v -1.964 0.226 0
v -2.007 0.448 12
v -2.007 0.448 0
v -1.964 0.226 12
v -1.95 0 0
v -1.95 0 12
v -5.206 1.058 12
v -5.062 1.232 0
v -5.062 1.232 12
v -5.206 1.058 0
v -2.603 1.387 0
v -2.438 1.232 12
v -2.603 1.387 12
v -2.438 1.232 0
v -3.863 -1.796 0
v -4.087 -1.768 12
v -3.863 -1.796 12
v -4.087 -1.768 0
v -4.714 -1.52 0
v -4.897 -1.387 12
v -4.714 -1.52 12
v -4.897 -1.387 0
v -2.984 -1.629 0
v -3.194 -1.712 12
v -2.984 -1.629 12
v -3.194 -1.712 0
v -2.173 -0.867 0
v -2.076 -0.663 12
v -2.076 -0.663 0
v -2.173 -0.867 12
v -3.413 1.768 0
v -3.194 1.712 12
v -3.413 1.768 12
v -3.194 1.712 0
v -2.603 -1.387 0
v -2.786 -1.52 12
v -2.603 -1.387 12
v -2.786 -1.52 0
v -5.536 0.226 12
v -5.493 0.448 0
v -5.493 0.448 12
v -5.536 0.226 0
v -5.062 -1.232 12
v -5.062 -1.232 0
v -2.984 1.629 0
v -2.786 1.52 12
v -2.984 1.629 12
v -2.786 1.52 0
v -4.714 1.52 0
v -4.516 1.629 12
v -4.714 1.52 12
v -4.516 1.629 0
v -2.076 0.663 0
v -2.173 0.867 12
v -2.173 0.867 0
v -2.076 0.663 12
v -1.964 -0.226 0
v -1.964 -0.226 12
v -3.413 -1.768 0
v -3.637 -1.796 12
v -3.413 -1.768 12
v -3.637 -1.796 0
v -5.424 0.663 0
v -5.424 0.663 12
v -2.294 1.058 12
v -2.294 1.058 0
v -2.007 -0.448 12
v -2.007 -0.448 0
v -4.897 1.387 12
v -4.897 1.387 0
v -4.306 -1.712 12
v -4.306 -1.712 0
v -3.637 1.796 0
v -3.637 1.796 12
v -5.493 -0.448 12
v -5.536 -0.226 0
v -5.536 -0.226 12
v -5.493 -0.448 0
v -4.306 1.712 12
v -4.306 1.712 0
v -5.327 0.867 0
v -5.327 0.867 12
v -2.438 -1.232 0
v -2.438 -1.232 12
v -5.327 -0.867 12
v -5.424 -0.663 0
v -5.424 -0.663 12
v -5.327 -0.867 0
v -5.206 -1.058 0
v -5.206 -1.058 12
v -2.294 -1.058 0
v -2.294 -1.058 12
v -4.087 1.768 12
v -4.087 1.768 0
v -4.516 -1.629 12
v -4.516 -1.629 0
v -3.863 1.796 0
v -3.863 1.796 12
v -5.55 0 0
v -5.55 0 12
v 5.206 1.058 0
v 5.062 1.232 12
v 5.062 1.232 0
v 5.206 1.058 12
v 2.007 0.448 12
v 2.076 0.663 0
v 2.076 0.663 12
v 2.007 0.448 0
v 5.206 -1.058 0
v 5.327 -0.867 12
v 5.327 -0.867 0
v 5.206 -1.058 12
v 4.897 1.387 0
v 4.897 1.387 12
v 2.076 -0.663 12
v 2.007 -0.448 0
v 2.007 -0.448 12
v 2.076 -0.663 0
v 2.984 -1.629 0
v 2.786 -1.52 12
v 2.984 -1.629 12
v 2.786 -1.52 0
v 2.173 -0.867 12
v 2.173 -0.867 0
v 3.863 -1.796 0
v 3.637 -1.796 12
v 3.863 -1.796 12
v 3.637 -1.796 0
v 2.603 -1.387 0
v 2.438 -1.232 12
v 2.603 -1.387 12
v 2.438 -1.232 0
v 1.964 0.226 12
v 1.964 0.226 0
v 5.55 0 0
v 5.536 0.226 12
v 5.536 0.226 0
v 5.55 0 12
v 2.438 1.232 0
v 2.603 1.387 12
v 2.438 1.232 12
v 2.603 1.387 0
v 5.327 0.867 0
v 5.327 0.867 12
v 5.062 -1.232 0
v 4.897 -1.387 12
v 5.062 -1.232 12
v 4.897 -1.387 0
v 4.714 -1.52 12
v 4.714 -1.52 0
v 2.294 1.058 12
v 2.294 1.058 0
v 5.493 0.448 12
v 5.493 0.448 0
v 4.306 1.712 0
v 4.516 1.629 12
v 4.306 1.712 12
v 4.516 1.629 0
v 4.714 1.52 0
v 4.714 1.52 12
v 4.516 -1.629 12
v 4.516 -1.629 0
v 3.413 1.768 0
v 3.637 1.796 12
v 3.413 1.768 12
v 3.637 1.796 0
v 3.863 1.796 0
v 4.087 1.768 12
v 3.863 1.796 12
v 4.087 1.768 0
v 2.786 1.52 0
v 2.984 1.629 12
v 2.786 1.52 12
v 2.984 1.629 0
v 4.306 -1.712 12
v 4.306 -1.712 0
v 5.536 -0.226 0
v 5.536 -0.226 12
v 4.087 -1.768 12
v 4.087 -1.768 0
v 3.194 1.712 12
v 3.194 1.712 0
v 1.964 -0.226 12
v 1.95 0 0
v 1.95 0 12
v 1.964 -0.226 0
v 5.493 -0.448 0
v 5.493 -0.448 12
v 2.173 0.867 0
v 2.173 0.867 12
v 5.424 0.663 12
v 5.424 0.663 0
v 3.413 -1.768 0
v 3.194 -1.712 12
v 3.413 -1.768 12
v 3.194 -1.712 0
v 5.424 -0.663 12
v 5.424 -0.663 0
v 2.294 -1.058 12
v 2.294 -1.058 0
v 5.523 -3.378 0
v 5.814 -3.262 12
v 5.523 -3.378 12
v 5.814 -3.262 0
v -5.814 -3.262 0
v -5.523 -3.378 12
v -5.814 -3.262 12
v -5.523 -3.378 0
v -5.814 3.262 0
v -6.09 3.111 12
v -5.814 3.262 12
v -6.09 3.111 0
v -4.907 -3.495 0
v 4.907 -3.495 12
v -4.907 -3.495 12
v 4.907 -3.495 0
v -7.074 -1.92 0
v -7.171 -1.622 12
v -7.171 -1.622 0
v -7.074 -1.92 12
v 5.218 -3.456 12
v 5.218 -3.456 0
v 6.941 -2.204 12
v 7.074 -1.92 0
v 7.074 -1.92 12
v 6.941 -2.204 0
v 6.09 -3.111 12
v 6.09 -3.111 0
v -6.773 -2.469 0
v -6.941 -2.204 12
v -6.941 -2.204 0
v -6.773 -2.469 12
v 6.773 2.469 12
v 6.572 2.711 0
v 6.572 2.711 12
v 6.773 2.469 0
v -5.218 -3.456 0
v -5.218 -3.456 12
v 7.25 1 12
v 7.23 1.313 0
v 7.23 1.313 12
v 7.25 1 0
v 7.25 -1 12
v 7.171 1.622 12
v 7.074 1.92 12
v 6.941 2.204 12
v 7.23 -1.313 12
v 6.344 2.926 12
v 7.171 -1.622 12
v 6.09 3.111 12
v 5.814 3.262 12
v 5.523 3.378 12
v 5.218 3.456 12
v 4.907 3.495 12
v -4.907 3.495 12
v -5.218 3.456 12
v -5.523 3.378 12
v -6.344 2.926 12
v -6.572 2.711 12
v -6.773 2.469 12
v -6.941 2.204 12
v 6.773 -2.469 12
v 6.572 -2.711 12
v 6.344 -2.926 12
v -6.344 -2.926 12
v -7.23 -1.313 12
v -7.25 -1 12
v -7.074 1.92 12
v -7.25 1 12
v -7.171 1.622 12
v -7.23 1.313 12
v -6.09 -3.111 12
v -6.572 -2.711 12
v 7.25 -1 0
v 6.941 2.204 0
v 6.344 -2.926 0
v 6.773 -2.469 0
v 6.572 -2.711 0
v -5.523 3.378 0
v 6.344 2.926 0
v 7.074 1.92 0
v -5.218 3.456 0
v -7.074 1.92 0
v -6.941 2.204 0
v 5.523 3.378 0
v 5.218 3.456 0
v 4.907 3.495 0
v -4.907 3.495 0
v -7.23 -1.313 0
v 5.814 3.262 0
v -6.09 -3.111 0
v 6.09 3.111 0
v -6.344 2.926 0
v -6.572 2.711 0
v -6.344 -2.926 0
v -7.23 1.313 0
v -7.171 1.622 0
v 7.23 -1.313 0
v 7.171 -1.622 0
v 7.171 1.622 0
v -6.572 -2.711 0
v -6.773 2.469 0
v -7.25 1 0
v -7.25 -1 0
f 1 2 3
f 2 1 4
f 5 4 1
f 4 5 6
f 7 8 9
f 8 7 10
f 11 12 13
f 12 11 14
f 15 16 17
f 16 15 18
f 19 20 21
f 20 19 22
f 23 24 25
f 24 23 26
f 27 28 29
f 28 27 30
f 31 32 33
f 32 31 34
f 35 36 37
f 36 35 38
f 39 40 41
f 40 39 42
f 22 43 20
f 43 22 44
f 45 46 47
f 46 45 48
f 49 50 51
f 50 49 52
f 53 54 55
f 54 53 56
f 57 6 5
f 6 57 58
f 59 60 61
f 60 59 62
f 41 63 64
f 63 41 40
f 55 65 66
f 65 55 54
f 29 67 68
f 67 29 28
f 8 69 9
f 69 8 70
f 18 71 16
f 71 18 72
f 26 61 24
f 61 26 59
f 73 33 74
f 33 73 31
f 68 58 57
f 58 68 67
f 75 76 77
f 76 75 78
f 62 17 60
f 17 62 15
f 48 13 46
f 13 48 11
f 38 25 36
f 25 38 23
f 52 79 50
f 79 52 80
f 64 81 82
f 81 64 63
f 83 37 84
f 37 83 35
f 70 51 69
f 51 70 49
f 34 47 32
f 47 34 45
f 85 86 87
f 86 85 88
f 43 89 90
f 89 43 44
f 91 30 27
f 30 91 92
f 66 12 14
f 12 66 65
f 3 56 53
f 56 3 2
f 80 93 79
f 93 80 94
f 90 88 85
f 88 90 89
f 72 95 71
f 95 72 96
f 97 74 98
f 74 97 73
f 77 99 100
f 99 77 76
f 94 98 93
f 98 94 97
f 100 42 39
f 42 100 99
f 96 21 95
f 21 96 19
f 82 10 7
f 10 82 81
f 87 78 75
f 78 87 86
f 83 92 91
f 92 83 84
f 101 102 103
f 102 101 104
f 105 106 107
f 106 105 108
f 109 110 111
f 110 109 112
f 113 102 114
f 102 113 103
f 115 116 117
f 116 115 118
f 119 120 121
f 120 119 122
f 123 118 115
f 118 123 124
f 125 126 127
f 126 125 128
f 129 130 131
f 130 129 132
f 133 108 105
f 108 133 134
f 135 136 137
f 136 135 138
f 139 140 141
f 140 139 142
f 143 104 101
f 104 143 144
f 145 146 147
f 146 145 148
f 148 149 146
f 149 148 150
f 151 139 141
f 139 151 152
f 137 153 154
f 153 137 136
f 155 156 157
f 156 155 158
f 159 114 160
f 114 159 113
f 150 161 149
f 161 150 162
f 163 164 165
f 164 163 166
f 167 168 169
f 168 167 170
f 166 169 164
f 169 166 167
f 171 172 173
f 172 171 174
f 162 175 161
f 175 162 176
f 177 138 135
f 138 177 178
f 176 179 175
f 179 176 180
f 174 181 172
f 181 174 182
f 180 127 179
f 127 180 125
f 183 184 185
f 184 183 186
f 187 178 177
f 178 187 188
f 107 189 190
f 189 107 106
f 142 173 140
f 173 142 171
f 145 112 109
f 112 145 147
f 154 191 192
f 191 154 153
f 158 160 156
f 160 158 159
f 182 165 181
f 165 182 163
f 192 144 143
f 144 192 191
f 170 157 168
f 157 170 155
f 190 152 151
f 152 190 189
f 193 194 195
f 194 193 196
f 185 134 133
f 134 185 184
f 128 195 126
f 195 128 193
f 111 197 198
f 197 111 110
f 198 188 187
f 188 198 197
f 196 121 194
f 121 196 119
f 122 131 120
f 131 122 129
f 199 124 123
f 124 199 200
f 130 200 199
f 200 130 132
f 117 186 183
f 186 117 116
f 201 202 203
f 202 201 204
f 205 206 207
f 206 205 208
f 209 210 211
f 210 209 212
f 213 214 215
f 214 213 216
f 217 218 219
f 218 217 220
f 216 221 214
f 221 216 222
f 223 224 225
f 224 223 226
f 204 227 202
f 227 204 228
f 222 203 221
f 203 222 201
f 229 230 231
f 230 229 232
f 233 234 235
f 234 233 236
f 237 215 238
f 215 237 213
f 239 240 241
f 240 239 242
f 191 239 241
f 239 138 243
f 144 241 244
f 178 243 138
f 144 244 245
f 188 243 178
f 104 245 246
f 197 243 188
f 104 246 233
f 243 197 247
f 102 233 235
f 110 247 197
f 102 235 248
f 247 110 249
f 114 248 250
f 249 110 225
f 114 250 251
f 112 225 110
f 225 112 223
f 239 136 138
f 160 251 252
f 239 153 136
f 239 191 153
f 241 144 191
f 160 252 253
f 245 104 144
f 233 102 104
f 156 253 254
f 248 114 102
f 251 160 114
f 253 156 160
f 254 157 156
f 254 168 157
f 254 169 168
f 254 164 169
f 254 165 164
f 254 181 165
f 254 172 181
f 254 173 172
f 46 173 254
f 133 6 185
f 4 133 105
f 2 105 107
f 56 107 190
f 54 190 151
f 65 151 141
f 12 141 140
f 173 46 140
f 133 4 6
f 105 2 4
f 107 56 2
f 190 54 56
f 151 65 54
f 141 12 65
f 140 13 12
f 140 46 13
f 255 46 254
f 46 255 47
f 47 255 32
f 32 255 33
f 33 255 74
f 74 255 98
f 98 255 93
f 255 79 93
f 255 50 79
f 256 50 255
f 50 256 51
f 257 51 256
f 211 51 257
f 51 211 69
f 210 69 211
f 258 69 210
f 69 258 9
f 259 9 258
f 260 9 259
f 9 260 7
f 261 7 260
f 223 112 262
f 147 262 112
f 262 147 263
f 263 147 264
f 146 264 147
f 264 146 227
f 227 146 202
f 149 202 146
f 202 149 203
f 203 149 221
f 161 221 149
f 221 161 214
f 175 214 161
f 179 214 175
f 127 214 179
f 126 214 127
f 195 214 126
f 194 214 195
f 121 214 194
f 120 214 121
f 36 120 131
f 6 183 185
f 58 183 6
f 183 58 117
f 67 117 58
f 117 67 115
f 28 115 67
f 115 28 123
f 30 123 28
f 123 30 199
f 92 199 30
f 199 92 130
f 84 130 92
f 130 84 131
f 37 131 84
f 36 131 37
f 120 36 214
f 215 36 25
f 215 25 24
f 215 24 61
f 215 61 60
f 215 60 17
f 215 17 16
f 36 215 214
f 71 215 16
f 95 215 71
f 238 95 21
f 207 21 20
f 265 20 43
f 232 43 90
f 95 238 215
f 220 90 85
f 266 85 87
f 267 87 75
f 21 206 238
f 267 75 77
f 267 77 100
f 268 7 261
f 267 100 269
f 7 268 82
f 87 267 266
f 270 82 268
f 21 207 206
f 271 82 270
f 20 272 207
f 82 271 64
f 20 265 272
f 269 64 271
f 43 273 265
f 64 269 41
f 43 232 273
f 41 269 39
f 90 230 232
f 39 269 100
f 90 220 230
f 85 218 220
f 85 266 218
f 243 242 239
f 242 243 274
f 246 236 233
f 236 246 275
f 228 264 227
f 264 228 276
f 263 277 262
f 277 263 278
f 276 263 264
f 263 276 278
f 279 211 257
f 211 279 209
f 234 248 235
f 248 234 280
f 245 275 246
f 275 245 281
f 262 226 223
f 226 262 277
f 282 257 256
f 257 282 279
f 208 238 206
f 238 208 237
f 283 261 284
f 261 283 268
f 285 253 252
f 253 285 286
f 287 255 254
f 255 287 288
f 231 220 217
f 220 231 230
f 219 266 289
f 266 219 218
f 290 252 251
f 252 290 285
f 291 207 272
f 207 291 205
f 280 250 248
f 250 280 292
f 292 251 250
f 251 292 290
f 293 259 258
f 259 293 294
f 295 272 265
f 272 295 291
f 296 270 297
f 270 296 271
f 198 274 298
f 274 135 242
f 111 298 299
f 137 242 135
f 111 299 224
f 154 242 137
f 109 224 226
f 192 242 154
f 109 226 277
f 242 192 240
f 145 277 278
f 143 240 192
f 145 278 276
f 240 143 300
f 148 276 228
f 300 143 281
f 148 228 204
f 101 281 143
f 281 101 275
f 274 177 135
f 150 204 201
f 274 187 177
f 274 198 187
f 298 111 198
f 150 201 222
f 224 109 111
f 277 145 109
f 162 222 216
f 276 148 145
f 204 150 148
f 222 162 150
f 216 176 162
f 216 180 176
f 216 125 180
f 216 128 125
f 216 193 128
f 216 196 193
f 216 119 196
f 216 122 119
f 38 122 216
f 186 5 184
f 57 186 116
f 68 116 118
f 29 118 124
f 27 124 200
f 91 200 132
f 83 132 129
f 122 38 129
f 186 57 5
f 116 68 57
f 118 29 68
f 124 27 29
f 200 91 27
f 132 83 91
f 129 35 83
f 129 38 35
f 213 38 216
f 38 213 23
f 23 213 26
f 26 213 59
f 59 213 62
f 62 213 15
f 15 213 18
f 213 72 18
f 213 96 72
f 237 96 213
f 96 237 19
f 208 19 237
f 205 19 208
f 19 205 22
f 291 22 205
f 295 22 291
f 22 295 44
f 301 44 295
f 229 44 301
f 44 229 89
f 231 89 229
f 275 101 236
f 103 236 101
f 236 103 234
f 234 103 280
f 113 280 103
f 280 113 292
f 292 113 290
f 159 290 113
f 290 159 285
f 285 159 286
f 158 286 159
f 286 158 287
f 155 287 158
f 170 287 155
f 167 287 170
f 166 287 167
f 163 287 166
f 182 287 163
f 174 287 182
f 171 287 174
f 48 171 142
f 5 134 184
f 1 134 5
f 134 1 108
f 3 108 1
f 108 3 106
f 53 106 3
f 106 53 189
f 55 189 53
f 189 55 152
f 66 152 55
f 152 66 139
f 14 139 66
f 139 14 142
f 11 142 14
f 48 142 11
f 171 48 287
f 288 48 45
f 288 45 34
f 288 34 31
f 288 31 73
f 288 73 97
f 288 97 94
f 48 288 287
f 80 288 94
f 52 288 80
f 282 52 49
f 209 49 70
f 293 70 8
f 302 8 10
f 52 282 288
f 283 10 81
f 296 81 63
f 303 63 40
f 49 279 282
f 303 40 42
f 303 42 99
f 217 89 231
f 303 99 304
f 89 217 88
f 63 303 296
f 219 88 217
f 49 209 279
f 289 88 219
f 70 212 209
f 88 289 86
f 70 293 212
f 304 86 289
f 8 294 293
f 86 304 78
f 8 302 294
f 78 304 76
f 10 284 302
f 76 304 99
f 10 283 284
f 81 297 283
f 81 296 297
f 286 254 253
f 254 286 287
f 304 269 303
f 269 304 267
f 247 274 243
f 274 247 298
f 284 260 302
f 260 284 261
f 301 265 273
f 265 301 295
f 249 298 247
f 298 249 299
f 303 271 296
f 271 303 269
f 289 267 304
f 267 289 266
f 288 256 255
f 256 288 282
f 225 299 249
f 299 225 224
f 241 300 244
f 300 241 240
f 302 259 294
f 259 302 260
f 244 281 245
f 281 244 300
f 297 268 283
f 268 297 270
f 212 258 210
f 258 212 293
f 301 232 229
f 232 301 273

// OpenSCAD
$fn = 50;


difference() {
	union() {
		translate(v = [0, 0, 0]) {
			rotate(a = [0, 0, 0]) {
				hull() {
					translate(v = [-4.7500000000, 1.0000000000, 0]) {
						rotate(a = [0, 0, 0]) {
							translate(v = [0, 0, 0]) {
								rotate(a = [0, 0, 0]) {
									cylinder(h = 12, r = 2.5000000000);
								}
							}
						}
					}
					translate(v = [4.7500000000, 1.0000000000, 0]) {
						rotate(a = [0, 0, 0]) {
							translate(v = [0, 0, 0]) {
								rotate(a = [0, 0, 0]) {
									cylinder(h = 12, r = 2.5000000000);
								}
							}
						}
					}
					translate(v = [-4.7500000000, -1.0000000000, 0]) {
						rotate(a = [0, 0, 0]) {
							translate(v = [0, 0, 0]) {
								rotate(a = [0, 0, 0]) {
									cylinder(h = 12, r = 2.5000000000);
								}
							}
						}
					}
					translate(v = [4.7500000000, -1.0000000000, 0]) {
						rotate(a = [0, 0, 0]) {
							translate(v = [0, 0, 0]) {
								rotate(a = [0, 0, 0]) {
									cylinder(h = 12, r = 2.5000000000);
								}
							}
						}
					}
				}
			}
		}
	}
	union() {
		translate(v = [-3.7500000000, 0.0000000000, 0]) {
			rotate(a = [0, 0, 0]) {
				translate(v = [0, 0, -50]) {
					rotate(a = [0, 0, 0]) {
						cylinder(h = 100, r = 1.8000000000);
					}
				}
			}
		}
		translate(v = [3.7500000000, 0.0000000000, 0]) {
			rotate(a = [0, 0, 0]) {
				translate(v = [0, 0, -50]) {
					rotate(a = [0, 0, 0]) {
						cylinder(h = 100, r = 1.8000000000);
					}
				}
			}
		}
	}
}
